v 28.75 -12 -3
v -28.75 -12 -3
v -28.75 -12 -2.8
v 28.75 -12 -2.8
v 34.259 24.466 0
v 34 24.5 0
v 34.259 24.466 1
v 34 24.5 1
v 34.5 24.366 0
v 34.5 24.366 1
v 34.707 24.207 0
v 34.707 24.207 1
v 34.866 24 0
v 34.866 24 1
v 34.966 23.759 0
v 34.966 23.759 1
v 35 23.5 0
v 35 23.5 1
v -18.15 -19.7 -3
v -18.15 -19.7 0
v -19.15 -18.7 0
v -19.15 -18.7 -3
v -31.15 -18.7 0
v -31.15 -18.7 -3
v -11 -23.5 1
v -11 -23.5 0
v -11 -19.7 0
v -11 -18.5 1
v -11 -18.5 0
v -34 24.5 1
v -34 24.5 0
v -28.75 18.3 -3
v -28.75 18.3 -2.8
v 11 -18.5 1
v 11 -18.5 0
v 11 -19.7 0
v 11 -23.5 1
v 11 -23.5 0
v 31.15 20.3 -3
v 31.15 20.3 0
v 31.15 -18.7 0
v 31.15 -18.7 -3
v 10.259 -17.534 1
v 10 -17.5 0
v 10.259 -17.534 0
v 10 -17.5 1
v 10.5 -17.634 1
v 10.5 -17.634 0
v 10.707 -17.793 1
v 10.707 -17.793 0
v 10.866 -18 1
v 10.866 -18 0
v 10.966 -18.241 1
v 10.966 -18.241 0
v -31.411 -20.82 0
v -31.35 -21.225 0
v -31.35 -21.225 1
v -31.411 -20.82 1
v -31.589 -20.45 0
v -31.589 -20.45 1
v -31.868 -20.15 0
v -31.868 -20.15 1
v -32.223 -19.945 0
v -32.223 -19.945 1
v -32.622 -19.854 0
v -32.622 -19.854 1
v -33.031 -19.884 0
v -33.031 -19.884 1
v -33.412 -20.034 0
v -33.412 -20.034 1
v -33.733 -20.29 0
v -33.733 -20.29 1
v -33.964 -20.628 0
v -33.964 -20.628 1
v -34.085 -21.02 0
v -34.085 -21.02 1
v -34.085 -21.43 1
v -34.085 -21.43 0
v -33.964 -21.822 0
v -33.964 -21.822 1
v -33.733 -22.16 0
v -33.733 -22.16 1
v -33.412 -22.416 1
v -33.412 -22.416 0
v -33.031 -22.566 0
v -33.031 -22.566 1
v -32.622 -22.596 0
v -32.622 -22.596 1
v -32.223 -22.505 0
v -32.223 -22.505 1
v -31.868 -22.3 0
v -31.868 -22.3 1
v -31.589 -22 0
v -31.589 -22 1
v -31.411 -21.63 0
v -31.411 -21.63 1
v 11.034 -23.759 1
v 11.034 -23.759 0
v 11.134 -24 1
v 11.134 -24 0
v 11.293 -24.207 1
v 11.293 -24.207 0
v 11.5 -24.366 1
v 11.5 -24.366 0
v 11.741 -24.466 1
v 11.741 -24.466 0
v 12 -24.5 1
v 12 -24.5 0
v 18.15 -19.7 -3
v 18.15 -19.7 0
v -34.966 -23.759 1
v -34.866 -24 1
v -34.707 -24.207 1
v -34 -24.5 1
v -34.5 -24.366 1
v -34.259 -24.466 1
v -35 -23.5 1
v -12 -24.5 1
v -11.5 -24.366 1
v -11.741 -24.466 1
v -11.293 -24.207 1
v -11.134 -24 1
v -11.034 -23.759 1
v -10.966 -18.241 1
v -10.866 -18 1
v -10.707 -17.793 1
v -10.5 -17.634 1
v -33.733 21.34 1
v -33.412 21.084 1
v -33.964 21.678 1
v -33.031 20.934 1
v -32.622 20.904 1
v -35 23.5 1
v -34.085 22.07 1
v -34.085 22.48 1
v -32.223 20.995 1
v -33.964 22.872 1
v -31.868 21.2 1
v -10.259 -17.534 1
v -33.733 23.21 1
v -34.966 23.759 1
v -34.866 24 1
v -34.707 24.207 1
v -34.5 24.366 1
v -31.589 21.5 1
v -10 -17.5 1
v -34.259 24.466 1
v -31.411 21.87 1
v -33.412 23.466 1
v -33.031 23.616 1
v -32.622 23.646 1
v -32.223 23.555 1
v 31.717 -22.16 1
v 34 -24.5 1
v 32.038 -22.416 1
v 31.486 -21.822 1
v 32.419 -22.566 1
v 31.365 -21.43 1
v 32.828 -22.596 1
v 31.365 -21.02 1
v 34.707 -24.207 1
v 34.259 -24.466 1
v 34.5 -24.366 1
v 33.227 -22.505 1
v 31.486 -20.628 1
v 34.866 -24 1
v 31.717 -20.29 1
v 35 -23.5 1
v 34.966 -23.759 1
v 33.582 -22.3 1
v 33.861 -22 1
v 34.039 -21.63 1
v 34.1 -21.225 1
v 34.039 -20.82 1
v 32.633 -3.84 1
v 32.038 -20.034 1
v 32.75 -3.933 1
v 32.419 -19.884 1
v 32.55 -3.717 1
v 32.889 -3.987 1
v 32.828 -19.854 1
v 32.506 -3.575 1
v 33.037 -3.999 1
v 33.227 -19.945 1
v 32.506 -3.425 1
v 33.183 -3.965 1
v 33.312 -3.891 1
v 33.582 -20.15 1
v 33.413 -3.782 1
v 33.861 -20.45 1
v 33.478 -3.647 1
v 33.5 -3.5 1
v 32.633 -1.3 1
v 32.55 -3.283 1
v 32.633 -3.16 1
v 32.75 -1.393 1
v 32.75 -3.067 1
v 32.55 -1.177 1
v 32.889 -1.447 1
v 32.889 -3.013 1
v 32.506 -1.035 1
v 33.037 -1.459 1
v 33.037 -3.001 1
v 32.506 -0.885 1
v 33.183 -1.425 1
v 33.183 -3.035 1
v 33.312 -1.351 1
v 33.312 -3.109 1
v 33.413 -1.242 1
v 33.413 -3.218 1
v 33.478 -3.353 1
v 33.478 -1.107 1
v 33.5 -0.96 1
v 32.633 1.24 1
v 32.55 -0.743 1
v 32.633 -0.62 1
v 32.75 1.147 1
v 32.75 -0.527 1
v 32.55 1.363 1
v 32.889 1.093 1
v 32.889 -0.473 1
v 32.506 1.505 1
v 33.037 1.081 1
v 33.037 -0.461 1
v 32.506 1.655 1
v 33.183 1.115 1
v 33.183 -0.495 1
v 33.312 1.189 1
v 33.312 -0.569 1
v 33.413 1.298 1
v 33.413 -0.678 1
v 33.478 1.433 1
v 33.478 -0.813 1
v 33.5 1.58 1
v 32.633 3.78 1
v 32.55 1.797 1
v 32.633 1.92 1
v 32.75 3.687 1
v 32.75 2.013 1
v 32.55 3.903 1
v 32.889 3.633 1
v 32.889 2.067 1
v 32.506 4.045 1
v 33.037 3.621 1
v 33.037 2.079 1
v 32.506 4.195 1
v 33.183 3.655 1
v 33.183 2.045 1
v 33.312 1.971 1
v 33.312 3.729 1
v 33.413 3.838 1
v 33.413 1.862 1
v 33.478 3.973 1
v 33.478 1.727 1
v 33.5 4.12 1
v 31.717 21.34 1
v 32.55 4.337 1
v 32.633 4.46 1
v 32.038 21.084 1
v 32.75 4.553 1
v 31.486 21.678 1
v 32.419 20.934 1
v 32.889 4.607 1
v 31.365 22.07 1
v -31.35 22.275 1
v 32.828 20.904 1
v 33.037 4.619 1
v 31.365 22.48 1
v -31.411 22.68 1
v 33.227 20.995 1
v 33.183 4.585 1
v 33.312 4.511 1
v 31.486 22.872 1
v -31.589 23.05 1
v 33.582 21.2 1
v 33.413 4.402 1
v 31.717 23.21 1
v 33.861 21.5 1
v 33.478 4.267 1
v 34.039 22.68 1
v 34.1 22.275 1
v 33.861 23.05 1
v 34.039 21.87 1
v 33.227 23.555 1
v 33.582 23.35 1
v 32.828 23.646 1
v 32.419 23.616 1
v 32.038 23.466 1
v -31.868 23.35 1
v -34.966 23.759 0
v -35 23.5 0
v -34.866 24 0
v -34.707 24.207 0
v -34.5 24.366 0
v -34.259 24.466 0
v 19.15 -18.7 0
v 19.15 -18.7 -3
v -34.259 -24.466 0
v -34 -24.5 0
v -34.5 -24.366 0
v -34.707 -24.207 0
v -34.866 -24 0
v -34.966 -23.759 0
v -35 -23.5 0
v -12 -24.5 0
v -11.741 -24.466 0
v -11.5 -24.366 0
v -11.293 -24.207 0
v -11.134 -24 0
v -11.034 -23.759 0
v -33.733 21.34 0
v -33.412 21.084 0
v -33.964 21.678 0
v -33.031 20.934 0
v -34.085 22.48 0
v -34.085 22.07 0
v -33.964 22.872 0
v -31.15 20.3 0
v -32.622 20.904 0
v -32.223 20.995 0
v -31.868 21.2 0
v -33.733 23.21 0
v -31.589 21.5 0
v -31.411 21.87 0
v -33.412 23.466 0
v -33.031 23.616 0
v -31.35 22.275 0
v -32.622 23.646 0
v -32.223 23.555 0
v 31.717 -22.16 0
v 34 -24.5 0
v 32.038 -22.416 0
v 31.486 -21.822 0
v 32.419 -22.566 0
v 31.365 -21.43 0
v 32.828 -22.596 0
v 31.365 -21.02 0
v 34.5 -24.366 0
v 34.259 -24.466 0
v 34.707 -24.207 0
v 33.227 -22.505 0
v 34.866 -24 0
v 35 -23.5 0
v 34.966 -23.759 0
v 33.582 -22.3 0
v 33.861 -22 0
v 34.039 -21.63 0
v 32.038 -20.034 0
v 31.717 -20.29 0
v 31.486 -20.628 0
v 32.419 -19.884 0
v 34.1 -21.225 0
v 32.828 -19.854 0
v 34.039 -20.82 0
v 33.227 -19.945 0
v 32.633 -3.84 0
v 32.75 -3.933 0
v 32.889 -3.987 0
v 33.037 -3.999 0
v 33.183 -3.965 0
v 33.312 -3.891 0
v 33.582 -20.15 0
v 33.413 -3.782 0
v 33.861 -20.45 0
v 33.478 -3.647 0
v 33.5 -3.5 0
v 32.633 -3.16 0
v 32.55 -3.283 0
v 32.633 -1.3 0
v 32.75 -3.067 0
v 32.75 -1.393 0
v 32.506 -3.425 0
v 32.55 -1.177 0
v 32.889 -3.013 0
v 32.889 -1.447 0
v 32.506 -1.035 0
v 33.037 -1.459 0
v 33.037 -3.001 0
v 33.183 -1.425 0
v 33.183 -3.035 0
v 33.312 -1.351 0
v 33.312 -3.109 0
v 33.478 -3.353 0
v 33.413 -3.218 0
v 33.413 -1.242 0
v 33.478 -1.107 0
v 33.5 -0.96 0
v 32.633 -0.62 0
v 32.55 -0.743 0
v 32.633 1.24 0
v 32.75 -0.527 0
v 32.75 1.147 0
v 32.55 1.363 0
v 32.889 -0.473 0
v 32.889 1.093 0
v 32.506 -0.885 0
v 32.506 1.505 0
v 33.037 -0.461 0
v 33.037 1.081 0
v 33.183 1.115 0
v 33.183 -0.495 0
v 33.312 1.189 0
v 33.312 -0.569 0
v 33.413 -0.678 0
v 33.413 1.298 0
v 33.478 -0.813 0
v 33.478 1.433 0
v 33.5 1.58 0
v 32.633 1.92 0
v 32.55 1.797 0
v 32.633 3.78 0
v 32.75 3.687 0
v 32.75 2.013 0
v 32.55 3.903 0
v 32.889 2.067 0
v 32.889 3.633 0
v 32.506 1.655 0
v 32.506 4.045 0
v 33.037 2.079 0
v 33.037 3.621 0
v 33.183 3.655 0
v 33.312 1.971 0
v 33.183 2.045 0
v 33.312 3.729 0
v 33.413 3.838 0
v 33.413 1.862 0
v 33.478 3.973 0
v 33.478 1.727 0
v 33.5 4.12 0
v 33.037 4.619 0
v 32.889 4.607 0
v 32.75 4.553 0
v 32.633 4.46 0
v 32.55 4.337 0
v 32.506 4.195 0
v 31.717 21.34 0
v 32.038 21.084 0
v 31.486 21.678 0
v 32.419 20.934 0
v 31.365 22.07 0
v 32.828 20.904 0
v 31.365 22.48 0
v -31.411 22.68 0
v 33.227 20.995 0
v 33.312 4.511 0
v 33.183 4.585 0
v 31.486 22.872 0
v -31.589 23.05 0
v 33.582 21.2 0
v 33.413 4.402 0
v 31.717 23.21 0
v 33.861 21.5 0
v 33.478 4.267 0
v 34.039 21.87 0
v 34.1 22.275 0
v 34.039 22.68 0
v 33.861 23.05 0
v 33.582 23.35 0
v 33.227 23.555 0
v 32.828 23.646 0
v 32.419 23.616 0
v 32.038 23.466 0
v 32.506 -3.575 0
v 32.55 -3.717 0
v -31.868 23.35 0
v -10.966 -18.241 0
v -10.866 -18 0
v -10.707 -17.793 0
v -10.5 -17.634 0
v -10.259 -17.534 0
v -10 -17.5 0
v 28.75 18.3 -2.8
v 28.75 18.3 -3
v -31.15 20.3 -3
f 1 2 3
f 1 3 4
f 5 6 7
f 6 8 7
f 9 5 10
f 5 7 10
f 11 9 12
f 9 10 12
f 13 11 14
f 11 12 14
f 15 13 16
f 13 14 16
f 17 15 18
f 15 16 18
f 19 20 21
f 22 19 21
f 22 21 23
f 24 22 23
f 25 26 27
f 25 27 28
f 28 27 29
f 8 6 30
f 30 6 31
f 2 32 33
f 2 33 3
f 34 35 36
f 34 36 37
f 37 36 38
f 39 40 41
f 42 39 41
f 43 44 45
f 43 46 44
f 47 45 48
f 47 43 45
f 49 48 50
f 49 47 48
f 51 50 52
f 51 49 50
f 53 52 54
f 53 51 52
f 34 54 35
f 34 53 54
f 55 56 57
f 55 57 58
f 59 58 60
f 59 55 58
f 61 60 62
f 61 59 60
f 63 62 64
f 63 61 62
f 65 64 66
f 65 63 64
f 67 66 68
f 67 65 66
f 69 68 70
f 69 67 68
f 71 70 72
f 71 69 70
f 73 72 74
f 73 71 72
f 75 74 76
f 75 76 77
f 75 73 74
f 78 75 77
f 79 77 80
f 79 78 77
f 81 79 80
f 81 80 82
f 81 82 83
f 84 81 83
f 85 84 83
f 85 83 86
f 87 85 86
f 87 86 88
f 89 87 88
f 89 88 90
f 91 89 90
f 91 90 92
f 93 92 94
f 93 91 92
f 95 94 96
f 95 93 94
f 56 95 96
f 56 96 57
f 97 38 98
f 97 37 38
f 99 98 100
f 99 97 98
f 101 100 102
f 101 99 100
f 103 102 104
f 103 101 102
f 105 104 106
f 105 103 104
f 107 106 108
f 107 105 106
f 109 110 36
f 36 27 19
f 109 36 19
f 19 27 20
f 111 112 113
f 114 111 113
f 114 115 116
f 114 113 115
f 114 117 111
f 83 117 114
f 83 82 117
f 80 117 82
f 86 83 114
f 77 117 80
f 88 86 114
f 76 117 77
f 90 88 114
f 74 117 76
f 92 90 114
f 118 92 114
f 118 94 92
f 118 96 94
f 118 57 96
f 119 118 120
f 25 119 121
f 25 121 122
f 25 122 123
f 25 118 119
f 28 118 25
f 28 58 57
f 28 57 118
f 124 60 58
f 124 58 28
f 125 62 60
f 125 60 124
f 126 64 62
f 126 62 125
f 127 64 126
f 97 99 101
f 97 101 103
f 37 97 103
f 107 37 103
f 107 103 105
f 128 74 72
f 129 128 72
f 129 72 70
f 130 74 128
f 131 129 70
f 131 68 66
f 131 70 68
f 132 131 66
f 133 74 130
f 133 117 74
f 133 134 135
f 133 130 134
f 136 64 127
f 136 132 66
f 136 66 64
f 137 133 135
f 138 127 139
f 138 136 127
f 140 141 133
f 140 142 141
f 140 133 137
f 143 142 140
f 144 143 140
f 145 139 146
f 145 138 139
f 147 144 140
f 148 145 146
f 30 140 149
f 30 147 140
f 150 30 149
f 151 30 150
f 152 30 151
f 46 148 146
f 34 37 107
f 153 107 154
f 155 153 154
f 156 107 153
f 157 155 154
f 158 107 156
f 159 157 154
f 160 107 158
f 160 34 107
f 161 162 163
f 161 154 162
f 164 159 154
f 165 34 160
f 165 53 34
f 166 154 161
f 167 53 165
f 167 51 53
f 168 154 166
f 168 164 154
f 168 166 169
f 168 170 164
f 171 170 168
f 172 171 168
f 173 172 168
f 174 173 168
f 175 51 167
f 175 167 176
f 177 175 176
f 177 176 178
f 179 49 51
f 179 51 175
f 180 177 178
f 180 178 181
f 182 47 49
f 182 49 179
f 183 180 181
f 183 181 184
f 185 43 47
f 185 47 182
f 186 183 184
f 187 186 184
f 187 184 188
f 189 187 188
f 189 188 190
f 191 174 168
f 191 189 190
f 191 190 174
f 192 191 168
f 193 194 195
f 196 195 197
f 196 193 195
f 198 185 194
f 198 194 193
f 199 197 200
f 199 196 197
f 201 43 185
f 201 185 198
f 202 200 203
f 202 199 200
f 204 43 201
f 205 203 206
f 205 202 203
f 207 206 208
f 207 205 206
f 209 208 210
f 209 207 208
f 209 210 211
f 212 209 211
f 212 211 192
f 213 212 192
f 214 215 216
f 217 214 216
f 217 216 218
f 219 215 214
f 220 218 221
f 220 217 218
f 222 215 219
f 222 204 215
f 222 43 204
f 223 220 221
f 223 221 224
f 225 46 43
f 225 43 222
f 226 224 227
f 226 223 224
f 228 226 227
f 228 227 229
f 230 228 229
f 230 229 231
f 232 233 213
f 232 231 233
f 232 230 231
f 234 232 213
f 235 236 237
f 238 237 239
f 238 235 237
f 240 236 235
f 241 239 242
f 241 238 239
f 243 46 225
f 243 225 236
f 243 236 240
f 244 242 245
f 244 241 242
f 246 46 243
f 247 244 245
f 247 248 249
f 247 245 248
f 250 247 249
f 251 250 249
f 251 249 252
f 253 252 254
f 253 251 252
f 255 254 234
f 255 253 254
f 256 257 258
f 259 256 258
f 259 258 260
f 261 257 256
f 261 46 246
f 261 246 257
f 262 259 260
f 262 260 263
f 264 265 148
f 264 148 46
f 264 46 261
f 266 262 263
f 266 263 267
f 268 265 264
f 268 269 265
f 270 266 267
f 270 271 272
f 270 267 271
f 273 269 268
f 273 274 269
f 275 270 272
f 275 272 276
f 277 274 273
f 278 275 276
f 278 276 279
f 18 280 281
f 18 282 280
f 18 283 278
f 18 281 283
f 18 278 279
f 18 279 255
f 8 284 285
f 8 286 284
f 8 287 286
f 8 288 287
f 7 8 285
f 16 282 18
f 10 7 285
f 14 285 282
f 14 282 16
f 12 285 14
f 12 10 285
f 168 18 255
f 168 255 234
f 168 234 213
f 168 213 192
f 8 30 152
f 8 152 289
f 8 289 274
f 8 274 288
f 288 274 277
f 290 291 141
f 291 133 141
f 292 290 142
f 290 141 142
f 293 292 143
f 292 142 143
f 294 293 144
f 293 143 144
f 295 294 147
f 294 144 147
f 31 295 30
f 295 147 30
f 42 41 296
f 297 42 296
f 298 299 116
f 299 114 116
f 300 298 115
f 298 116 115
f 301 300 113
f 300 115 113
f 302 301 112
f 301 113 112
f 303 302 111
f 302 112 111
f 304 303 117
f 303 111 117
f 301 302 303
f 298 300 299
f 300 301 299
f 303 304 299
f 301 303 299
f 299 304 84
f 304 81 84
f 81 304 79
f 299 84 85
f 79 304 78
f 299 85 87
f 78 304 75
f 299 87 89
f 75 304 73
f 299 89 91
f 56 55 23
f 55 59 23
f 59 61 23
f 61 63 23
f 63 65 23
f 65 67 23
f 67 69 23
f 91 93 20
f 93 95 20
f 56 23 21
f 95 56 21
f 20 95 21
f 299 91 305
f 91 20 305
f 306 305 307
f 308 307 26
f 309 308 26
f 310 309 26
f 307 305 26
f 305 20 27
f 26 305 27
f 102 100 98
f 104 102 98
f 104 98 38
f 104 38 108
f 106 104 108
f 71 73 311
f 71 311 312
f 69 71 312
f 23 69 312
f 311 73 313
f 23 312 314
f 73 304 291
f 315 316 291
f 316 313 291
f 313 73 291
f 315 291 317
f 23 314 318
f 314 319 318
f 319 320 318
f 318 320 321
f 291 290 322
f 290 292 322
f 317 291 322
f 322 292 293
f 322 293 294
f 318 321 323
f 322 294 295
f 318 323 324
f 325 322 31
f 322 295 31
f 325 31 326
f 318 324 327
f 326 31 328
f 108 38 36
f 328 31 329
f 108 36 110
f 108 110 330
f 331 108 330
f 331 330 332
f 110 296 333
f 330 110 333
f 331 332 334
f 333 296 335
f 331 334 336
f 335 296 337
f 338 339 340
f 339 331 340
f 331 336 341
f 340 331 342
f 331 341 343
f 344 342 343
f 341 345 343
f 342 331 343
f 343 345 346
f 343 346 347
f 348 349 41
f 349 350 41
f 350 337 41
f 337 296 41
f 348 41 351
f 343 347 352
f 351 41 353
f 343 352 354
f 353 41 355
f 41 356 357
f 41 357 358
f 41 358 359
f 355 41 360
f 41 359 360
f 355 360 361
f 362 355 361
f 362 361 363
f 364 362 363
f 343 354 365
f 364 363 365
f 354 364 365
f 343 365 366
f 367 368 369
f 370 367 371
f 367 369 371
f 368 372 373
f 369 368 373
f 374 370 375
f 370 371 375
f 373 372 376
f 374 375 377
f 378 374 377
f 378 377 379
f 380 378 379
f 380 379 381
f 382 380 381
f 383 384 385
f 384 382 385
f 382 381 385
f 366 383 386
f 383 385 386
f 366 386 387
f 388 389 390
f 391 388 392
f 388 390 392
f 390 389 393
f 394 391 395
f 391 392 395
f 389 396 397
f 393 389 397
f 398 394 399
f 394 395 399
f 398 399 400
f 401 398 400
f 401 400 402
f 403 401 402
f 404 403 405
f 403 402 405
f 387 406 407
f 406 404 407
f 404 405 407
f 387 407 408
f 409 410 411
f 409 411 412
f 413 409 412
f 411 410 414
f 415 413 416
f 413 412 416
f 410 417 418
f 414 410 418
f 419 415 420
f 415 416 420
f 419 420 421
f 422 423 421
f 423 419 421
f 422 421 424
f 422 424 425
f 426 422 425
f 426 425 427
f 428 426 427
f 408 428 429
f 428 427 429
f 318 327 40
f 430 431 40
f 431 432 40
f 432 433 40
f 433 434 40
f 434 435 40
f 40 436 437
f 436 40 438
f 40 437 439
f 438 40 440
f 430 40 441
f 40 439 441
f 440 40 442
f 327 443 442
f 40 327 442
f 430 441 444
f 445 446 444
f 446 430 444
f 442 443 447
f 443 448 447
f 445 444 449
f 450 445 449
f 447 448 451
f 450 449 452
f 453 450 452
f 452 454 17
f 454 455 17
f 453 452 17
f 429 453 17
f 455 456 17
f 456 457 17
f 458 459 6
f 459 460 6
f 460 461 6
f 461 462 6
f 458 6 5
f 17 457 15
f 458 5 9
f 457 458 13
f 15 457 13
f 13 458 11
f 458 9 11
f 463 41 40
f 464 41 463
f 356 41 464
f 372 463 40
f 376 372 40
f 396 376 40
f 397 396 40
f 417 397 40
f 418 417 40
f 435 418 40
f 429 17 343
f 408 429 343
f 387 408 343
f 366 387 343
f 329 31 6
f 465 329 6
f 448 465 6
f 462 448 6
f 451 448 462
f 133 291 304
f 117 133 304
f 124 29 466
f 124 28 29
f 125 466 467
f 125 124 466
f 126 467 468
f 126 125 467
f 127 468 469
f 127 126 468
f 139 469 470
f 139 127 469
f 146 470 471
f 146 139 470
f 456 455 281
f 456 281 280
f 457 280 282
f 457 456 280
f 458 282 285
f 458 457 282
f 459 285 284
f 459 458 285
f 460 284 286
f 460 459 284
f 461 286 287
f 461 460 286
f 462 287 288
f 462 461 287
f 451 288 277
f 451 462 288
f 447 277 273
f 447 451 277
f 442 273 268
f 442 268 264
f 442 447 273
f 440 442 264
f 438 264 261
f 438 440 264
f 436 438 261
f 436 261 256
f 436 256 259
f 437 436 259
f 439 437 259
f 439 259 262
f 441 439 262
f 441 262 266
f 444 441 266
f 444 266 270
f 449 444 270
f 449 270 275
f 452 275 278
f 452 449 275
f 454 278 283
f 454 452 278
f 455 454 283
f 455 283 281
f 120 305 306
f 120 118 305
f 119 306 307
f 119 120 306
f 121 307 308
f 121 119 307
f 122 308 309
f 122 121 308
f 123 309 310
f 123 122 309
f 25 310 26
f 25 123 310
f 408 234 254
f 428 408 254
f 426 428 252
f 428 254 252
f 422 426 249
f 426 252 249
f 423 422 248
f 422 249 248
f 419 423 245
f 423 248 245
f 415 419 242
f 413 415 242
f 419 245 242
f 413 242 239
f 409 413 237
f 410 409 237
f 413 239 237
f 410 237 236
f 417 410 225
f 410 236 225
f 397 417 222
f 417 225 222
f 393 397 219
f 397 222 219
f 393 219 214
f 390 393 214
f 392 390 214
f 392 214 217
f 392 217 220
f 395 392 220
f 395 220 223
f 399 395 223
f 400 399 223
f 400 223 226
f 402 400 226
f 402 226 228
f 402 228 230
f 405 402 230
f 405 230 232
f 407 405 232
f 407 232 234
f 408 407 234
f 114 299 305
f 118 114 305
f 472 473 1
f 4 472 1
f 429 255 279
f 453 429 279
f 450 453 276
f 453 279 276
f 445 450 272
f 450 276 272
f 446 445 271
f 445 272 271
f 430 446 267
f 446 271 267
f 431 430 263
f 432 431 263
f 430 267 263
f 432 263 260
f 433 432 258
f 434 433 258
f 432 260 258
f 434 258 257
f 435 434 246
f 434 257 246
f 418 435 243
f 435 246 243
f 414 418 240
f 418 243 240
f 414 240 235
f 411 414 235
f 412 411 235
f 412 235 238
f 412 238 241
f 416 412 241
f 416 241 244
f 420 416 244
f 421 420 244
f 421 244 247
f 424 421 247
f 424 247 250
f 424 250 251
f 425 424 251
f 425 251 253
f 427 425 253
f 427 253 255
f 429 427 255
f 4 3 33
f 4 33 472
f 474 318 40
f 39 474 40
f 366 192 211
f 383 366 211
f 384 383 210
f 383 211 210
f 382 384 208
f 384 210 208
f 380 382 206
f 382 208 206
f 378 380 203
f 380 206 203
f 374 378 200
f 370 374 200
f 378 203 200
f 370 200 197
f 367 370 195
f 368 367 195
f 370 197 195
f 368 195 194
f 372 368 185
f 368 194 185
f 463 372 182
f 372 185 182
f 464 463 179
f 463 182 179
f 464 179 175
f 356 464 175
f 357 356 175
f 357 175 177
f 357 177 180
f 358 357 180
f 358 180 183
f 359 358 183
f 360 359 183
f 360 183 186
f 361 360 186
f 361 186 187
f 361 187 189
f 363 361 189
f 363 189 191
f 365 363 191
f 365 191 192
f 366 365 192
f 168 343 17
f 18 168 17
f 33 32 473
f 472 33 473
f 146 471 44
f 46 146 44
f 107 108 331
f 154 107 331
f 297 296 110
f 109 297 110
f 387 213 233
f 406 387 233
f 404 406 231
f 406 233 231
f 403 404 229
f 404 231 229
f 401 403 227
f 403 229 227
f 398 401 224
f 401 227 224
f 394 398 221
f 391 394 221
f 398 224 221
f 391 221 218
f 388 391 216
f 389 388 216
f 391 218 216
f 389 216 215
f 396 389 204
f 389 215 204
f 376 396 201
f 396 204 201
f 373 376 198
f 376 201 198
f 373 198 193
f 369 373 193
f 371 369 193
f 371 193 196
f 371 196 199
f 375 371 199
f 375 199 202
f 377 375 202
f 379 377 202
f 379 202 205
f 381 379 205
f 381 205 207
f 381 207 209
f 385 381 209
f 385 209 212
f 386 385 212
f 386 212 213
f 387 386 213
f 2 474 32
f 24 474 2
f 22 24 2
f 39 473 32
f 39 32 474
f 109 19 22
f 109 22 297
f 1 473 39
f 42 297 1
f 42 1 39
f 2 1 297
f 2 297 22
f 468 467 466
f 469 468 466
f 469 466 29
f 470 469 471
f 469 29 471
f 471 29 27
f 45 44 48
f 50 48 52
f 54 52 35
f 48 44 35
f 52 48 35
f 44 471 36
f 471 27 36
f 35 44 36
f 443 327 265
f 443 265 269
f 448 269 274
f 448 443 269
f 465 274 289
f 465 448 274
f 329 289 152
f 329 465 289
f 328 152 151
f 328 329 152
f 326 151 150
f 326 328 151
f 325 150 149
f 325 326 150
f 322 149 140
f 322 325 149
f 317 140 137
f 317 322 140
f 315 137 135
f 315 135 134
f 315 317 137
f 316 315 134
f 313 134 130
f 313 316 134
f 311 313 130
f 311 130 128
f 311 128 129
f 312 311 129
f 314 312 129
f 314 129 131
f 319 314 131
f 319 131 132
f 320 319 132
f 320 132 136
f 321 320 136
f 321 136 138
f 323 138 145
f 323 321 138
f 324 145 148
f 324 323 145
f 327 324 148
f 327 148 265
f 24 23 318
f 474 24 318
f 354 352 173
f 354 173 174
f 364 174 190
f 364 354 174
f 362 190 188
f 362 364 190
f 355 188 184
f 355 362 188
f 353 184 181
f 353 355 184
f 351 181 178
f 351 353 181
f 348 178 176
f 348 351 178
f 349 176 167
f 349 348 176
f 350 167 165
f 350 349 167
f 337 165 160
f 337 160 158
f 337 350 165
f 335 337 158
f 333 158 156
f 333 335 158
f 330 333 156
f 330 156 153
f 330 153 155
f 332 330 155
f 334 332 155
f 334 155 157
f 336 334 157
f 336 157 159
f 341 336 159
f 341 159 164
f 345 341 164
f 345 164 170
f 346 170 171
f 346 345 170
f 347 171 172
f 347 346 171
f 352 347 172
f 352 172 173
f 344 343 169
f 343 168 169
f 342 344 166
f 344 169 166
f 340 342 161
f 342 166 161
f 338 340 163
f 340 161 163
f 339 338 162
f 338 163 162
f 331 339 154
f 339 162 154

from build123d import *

# Parameters (mm, degrees)
SKETCH010_R     = 1.375
PAD005_DEPTH    = 1
FILLET001_R     = 1
PAD006_DEPTH    = 3
SKETCH012_W     = 57.5
SKETCH012_H     = 30.3
POCKET002_DEPTH = 0.2
SKETCH013_R     = 0.5
POCKET003_DEPTH = 4.001


with BuildPart() as part:
    # Sketch010 (on XY_Plane004 of Origin008) → Pad005 (new body)
    with BuildSketch(Plane.XY):
        Polygon((-35, -24.5), (-11, -24.5), (-11, -17.5), (0, -17.5), (11, -17.5), (11, -24.5), (35, -24.5), (35, 24.5), (-35, 24.5), align=None)
        with Locations((-32.725, 22.275)):
            Circle(SKETCH010_R, mode=Mode.SUBTRACT)
        with Locations((32.725, 22.275)):
            Circle(SKETCH010_R, mode=Mode.SUBTRACT)
        with Locations((-32.725, -21.225)):
            Circle(SKETCH010_R, mode=Mode.SUBTRACT)
        with Locations((32.725, -21.225)):
            Circle(SKETCH010_R, mode=Mode.SUBTRACT)
    extrude(amount=PAD005_DEPTH)

    # Fillet001
    fillet001_edges = [part.edges().sort_by_distance(p)[0] for p in [
        (-35, 24.5, 0.5),
        (35, 24.5, 0.5),
        (35, -24.5, 0.5),
        (-11, -17.5, 0.5),
        (-11, -24.5, 0.5),
        (11, -24.5, 0.5),
        (11, -17.5, 0.5),
        (-35, -24.5, 0.5),
    ]]
    fillet(fillet001_edges, radius=FILLET001_R)

    # Sketch011 (on Face2 of Fillet001) → Pad006 (join)
    with BuildSketch(Plane(origin=(0, 0, 0), x_dir=(1, 0, 0), z_dir=(0, 0, -1))):
        Polygon((-31.15, 18.7), (-31.15, -20.3), (31.15, -20.3), (31.15, 18.7), (19.15, 18.7), (18.15, 19.7), (-18.15, 19.7), (-19.15, 18.7), align=None)
    extrude(amount=PAD006_DEPTH)

    # Sketch012 (on Face32 of Pad006) → Pocket002 (cut)
    with BuildSketch(Plane(origin=(0, 0, -3), x_dir=(1, 0, 0), z_dir=(0, 0, -1))):
        with Locations((0, -3.15)):
            Rectangle(SKETCH012_W, SKETCH012_H)
    extrude(amount=-POCKET002_DEPTH, mode=Mode.SUBTRACT)

    # Sketch013 (on Face5 of Pocket002) → Pocket003 (cut, through all)
    with BuildSketch(Plane.XY.offset(1)):
        with Locations((33, -3.5)):
            Circle(SKETCH013_R)
        with Locations((33, -0.96)):
            Circle(SKETCH013_R)
        with Locations((33, 1.58)):
            Circle(SKETCH013_R)
        with Locations((33, 4.12)):
            Circle(SKETCH013_R)
    extrude(amount=-POCKET003_DEPTH, mode=Mode.SUBTRACT)


solid = part.part
